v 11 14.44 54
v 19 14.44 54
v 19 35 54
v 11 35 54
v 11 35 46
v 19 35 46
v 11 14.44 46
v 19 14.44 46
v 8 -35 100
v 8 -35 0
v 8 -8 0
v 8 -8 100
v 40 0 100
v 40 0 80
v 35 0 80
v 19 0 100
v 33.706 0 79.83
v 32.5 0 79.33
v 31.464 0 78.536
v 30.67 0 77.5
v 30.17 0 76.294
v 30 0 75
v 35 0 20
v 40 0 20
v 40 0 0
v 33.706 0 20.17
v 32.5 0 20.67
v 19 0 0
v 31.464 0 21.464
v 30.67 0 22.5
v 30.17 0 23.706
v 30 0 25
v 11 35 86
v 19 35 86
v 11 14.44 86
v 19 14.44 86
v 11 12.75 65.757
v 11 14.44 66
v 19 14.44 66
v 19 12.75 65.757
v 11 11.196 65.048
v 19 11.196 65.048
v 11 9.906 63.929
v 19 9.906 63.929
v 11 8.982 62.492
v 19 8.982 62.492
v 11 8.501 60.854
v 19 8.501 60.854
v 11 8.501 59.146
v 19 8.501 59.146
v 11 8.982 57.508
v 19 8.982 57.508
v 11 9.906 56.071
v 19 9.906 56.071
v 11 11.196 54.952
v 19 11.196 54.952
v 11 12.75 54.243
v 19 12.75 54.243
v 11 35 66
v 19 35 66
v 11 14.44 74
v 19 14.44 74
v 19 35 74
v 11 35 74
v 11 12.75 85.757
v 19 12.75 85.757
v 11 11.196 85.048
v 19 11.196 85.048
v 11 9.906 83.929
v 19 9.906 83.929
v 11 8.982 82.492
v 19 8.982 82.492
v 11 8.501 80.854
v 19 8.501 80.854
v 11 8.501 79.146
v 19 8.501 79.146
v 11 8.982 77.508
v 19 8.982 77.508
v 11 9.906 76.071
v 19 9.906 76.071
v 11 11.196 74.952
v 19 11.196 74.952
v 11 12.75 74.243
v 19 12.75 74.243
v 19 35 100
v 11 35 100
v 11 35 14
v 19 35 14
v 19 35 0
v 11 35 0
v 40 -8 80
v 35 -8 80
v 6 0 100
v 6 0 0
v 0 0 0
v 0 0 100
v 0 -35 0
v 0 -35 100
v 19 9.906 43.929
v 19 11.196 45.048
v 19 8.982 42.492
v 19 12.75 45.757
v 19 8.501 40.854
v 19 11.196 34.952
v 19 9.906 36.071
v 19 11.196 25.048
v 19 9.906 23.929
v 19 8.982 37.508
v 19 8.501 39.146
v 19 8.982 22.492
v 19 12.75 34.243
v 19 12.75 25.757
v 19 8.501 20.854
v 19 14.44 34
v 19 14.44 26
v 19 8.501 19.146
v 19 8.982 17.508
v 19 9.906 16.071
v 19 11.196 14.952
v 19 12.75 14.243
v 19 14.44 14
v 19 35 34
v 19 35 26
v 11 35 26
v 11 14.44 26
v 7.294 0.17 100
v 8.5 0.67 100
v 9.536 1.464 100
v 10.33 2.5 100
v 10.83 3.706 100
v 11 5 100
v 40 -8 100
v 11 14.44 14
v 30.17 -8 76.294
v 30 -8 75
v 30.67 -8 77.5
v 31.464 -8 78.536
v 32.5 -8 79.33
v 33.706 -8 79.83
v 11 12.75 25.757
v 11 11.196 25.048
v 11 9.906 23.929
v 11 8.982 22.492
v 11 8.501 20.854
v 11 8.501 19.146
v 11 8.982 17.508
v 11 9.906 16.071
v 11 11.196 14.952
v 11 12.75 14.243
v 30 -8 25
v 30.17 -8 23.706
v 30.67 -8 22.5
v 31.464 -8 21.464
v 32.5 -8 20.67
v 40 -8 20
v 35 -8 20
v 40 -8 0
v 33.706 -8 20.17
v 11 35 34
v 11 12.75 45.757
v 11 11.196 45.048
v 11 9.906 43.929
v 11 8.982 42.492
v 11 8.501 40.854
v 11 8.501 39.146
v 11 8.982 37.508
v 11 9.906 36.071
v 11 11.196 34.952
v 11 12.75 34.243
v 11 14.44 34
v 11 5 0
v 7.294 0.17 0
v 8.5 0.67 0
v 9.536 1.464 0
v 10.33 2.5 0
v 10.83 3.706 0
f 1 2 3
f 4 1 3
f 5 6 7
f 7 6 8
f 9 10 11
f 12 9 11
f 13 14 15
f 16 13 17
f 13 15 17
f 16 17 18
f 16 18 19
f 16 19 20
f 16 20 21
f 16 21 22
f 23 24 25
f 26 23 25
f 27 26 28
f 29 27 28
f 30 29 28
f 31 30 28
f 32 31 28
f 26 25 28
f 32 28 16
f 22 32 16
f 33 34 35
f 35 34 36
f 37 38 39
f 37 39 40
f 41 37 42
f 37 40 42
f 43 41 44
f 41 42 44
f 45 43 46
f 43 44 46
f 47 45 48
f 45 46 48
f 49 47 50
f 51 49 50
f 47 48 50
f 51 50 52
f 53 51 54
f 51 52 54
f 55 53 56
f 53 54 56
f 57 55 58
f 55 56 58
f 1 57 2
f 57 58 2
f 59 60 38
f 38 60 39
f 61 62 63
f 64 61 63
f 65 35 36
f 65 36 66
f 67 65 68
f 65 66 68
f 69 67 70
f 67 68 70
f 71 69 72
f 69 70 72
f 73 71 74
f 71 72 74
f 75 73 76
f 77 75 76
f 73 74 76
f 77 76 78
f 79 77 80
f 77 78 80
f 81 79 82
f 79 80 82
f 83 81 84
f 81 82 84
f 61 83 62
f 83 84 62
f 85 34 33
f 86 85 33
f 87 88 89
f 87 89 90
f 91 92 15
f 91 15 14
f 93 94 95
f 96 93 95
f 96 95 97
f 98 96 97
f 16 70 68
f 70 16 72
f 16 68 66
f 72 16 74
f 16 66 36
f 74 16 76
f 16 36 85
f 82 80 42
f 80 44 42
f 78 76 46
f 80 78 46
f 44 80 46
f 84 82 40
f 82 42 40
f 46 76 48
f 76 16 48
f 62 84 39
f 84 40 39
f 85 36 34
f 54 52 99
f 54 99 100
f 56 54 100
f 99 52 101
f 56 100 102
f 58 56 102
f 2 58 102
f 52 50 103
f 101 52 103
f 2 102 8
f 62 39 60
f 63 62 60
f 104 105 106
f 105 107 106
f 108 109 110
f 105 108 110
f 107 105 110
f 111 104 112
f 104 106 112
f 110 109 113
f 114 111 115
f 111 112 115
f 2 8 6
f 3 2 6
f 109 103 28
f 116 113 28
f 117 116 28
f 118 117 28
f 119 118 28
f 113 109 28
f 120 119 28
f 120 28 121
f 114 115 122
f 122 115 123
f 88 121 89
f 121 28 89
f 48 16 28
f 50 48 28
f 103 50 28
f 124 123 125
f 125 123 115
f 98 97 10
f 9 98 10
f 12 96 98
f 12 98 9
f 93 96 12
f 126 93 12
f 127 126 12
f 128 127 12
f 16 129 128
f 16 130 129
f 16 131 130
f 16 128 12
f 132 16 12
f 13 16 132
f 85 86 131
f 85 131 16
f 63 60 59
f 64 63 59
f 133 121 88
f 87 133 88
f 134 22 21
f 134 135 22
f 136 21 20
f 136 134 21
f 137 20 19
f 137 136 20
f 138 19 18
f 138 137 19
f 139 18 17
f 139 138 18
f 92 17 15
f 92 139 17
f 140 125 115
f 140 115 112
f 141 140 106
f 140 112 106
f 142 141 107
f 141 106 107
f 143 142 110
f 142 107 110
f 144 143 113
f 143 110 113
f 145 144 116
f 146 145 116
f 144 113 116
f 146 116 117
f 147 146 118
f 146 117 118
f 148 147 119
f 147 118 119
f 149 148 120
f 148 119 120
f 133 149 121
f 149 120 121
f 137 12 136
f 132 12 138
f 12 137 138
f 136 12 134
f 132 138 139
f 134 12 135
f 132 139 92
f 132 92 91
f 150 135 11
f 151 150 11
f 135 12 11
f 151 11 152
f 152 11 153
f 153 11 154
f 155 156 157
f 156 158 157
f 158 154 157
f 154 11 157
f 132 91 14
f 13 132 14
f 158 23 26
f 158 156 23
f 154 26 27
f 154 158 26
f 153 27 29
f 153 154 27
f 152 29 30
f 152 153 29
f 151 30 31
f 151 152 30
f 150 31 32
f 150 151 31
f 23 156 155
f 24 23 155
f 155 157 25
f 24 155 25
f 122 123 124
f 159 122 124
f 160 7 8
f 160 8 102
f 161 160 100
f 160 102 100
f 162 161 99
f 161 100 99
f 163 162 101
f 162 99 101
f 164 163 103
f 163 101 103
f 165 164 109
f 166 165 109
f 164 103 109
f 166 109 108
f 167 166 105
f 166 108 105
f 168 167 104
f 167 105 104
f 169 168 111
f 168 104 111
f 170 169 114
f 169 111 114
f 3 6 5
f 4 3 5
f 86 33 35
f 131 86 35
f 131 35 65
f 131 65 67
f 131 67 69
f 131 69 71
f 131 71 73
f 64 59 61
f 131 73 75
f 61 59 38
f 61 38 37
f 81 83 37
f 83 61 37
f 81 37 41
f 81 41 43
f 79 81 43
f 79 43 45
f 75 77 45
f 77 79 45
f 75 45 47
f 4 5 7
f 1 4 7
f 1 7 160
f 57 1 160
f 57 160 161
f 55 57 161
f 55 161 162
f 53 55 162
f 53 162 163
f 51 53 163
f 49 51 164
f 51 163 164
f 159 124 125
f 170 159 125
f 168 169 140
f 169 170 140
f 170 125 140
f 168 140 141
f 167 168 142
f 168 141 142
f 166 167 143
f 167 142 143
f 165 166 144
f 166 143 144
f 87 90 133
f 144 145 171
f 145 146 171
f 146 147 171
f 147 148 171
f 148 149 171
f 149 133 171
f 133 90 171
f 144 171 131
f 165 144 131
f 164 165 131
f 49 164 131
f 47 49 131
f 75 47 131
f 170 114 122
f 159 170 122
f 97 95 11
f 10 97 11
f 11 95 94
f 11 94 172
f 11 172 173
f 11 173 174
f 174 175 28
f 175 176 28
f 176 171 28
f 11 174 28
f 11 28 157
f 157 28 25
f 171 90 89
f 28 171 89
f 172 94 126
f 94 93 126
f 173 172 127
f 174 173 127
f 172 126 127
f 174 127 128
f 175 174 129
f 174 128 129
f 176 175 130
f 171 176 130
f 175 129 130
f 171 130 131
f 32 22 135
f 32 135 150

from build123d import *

# Parameters (mm, degrees)
BOSS_EXTRUDE1_DEPTH = 100
SKETCH3_W           = 10
SKETCH3_H           = 60
CUT_EXTRUDE1_DEPTH  = 8
CUT_EXTRUDE2_DEPTH  = 8
LPATTERN1_COUNT     = 4
LPATTERN1_PITCH     = 20
FILLET1_R           = 5


with BuildPart() as part:
    # Sketch2 → Boss-Extrude1 (new body)
    with BuildSketch(Plane.XY):
        Polygon((0, 0), (0, -35), (8, -35), (8, -8), (40, -8), (40, 0), (19, 0), (19, 35), (11, 35), (11, 0), align=None)
    extrude(amount=BOSS_EXTRUDE1_DEPTH)

    # Sketch3 → Cut-Extrude1 (cut)
    with BuildSketch(Plane(origin=(0, 0, 0), x_dir=(1, 0, 0), z_dir=(0, 1, 0))):
        with Locations((35, -50)):
            Rectangle(SKETCH3_W, SKETCH3_H)
    extrude(amount=-CUT_EXTRUDE1_DEPTH, mode=Mode.SUBTRACT)

    # Sketch4 → Cut-Extrude2 (cut)
    with BuildSketch(Plane(origin=(19, 0, 0), x_dir=(0, 0, -1), z_dir=(1, 0, 0))):
        with BuildLine():
            Line((-86, 35), (-86, 14.440154261))
            ThreePointArc((-86, 14.440154261), (-80, 8.440154261), (-74, 14.440154261))
            Line((-74, 14.440154261), (-74, 35))
            Line((-74, 35), (-86, 35))
        make_face()
    cut_extrude2 = extrude(amount=-CUT_EXTRUDE2_DEPTH, mode=Mode.SUBTRACT)

    # LPattern1: Cut-Extrude2 ×4
    with Locations(*[(0, 0, -i * LPATTERN1_PITCH) for i in range(1, LPATTERN1_COUNT)]):
        add(cut_extrude2, mode=Mode.SUBTRACT)

    # Fillet1
    fillet1_edges = [part.edges().sort_by_distance(p)[0] for p in [
        (11, 0, 50),
        (30, -4, 80),
        (30, -4, 20),
    ]]
    fillet(fillet1_edges, radius=FILLET1_R)


solid = part.part
